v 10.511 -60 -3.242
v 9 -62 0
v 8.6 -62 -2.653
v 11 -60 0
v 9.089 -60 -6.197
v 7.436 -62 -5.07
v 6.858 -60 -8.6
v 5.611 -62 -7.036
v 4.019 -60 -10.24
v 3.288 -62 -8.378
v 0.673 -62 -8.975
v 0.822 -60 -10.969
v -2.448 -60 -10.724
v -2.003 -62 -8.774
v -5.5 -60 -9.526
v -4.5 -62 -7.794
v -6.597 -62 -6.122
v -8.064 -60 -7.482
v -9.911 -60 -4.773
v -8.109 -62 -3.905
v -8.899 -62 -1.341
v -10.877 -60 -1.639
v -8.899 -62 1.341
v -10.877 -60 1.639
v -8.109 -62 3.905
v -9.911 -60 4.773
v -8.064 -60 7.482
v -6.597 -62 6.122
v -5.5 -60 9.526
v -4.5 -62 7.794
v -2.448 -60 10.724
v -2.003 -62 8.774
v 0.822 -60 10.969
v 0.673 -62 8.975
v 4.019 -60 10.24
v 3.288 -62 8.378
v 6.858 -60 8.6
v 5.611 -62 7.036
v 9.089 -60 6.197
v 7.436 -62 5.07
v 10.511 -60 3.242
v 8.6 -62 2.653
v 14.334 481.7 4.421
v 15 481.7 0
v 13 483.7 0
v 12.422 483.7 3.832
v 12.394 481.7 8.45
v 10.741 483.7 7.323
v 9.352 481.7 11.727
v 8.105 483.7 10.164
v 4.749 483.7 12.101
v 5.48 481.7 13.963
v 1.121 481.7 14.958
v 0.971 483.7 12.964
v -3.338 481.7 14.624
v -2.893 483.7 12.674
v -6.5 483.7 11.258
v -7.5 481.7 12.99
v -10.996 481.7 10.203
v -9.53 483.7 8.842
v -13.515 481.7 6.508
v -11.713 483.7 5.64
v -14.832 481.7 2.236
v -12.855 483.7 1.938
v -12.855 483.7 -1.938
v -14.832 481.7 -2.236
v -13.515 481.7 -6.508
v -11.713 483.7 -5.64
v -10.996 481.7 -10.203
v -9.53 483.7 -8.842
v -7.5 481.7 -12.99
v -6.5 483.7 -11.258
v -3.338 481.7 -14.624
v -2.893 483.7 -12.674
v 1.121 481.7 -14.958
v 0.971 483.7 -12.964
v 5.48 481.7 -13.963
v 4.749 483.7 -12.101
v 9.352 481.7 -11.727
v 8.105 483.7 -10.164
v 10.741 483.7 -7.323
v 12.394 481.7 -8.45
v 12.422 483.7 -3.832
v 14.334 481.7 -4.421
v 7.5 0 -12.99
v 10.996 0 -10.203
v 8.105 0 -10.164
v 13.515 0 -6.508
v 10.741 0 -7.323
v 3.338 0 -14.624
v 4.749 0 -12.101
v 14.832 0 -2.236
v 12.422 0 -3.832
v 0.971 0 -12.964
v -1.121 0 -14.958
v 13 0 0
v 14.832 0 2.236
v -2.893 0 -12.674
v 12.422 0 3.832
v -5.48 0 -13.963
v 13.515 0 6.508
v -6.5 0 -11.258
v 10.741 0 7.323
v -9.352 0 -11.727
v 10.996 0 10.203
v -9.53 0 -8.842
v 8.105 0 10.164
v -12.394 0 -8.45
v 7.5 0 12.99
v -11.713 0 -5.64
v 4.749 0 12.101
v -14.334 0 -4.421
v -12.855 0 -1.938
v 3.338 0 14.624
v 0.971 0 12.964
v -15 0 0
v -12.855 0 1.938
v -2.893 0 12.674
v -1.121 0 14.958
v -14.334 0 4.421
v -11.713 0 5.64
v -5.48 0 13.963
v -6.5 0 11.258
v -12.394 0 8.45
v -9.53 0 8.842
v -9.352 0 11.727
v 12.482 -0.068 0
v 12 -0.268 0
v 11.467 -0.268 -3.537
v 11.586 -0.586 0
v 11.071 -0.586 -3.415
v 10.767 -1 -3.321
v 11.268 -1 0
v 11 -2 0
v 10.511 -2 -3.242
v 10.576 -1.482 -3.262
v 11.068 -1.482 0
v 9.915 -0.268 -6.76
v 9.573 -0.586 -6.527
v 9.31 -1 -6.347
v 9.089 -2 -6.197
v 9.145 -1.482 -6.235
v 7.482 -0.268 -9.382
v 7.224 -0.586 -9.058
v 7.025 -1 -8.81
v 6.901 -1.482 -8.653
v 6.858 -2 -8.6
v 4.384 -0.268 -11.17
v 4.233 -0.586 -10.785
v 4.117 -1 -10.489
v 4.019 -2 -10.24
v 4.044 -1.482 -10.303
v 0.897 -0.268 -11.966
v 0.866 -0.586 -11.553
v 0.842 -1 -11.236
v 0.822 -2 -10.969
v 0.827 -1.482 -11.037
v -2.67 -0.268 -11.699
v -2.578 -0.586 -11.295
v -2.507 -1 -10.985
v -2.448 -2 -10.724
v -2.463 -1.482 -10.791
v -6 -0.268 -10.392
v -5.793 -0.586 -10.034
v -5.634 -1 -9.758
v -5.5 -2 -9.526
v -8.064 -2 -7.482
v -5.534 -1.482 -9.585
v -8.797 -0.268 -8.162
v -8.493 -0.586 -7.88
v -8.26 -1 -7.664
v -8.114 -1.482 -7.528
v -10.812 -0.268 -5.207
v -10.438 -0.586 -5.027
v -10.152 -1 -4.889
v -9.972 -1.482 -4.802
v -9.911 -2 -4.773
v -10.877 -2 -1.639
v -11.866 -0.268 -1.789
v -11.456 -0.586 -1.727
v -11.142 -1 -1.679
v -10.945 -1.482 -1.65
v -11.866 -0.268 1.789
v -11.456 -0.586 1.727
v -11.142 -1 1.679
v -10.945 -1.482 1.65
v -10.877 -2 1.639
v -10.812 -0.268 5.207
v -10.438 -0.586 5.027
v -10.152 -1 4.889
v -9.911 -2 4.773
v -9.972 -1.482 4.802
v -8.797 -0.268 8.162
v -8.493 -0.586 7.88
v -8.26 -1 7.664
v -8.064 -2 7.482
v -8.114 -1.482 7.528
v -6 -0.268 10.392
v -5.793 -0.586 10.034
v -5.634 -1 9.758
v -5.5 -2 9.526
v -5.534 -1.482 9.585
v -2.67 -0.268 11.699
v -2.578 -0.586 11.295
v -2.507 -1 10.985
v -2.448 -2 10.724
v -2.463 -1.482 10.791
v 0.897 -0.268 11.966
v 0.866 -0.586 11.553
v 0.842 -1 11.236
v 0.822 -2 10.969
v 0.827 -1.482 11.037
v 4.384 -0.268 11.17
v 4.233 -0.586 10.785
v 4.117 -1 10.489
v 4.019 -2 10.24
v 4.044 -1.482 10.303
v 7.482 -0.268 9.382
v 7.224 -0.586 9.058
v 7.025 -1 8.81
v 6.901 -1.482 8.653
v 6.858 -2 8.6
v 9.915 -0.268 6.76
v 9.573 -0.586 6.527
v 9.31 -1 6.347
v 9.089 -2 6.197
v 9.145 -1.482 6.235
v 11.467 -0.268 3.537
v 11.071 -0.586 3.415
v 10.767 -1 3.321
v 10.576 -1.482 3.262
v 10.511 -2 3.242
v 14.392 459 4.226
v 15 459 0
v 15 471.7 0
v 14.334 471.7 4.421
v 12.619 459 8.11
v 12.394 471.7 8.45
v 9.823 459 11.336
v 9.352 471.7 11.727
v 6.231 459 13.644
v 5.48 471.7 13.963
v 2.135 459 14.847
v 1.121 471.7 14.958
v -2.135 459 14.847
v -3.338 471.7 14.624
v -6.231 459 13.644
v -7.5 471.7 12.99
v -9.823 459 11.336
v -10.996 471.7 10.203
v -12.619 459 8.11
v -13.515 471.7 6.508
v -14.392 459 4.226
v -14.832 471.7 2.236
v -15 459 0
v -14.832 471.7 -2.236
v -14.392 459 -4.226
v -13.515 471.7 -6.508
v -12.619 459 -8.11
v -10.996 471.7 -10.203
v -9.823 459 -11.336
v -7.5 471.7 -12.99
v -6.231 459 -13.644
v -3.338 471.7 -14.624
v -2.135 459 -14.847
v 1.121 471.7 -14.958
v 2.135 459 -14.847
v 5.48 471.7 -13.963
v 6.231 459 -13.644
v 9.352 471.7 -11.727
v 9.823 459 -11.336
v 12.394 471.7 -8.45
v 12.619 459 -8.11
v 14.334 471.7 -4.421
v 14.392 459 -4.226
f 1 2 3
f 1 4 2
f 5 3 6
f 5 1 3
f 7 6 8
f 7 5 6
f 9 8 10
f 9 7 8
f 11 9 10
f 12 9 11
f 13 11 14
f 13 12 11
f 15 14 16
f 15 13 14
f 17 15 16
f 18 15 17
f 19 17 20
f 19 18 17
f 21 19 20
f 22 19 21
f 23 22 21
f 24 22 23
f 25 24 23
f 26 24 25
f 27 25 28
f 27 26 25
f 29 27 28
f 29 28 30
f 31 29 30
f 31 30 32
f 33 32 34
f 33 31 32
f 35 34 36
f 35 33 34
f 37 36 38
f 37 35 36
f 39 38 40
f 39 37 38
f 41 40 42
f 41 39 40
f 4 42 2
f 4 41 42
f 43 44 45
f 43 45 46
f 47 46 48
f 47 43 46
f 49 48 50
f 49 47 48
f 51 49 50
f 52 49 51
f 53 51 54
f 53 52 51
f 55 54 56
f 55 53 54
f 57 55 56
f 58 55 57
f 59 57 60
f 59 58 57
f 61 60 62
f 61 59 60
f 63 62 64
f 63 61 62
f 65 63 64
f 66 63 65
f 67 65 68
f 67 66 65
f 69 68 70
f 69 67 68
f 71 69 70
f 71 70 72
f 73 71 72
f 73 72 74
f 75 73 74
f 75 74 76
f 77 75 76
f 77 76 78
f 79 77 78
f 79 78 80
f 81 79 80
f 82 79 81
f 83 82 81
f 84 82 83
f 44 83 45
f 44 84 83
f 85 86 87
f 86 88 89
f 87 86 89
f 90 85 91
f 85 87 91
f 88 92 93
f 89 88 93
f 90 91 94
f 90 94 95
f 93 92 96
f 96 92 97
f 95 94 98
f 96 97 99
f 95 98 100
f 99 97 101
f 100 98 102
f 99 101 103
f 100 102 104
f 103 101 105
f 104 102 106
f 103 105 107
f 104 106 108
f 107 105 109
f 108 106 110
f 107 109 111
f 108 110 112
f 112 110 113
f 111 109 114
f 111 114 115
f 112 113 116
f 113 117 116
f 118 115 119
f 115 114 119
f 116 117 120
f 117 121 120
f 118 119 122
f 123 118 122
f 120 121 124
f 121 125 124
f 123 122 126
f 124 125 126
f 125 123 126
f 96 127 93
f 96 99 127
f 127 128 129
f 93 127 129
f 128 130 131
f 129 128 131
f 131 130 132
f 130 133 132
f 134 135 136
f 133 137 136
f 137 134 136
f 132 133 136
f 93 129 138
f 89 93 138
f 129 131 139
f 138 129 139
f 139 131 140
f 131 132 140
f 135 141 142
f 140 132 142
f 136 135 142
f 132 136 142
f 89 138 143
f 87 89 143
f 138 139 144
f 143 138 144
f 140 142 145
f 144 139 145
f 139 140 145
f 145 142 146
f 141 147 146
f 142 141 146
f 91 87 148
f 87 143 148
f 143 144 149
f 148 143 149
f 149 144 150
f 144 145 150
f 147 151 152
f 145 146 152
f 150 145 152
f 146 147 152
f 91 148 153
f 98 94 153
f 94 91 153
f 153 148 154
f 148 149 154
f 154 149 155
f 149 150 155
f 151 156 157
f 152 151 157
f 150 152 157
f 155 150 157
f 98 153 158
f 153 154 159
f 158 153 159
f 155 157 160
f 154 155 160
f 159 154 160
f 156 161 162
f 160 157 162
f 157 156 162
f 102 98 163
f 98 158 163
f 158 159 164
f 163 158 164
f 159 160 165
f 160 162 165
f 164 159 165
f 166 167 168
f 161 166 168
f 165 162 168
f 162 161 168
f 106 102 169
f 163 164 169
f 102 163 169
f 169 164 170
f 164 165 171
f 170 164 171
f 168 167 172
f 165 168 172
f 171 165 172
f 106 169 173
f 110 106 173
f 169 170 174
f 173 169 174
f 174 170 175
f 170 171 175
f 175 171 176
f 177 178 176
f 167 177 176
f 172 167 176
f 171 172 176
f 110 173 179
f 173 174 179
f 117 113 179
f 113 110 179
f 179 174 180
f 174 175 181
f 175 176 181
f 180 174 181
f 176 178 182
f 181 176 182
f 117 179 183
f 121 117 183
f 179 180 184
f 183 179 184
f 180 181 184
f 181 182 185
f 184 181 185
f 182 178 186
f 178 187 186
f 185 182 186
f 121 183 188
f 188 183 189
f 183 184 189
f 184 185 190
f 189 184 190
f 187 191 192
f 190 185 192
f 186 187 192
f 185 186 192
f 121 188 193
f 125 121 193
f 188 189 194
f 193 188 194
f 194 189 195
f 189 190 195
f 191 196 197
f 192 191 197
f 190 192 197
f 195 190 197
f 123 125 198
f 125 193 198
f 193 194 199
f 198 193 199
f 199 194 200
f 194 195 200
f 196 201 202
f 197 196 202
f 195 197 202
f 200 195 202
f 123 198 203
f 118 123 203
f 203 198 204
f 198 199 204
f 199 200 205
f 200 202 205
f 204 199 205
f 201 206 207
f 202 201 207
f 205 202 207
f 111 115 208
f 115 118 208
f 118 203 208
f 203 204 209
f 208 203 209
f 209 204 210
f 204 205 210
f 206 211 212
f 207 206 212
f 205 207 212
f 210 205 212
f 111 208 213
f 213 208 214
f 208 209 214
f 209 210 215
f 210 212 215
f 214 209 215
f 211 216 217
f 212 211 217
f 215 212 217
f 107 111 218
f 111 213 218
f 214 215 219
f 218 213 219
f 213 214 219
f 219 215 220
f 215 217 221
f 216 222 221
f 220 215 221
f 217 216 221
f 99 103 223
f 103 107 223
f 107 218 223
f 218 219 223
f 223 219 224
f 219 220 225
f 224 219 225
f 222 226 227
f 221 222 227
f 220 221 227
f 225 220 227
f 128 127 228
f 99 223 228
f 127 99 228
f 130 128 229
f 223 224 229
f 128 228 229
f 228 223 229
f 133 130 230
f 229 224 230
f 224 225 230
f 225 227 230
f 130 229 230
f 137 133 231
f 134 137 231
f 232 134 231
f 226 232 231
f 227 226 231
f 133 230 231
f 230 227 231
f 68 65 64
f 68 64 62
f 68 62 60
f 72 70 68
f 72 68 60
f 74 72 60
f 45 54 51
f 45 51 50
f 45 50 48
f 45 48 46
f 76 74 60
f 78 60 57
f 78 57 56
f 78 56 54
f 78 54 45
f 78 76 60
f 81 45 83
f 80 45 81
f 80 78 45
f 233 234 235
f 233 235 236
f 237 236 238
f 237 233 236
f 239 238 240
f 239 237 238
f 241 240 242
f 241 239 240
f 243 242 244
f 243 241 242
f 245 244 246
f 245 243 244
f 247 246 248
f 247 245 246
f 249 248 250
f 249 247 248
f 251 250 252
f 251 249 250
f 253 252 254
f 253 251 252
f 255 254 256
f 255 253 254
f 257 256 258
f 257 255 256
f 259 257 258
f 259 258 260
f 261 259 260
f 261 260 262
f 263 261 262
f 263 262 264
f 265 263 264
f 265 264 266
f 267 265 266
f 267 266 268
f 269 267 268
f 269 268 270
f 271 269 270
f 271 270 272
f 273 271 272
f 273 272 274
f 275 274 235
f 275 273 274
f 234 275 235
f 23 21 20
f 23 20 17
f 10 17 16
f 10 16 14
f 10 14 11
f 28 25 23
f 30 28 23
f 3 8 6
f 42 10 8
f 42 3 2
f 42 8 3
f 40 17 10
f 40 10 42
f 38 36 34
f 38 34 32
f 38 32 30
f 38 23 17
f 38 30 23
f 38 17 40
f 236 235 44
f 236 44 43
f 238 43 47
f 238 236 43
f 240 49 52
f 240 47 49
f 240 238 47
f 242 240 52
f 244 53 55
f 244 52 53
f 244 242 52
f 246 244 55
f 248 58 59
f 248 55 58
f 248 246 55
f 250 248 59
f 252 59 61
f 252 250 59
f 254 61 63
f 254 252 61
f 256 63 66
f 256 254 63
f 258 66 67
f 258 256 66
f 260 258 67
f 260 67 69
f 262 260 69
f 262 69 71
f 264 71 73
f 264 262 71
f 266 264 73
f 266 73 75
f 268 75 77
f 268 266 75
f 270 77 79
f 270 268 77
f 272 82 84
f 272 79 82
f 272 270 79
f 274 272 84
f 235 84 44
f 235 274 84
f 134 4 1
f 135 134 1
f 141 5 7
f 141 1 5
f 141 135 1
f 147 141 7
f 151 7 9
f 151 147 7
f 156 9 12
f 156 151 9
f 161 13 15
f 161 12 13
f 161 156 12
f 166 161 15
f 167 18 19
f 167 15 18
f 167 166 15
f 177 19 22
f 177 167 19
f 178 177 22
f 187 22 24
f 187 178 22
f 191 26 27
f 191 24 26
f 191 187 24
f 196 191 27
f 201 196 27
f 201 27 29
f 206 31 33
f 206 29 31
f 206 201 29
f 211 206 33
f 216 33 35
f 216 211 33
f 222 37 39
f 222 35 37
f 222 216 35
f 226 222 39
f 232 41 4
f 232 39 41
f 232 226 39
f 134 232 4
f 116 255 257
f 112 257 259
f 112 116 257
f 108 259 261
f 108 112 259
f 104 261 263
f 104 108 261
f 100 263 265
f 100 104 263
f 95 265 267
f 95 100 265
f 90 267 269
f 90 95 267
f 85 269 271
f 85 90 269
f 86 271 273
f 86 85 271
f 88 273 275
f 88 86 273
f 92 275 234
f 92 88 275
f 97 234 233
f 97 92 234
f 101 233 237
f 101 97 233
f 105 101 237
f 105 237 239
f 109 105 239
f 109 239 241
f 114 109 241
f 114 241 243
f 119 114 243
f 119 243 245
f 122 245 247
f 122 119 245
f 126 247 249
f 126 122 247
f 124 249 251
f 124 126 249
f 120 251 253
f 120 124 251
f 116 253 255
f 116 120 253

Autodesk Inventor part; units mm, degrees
ref_plane "YZ Plane" through (0, 0, 0) normal (1, 0, 0) x (0, 1, 0)
ref_plane "XZ Plane" through (0, 0, 0) normal (0, 1, 0) x (-1, 0, 0)
ref_plane "XY Plane" through (0, 0, 0) normal (0, 0, 1) x (1, 0, 0)
sketch "Sketch1" plane through (0, 0, 0) normal (0, 1, 0) x (-1, 0, 0)
  circle A0 centre (0, 0) radius 15
  dimension "d0" = 30
extrude "Extrusion1" add sketch "Sketch1" along normal blind 459
sketch "Sketch2" plane through (0, 0, 0) normal (0, -1, 0) x (1, 0, 0)
  circle A0 centre (0, 0) radius 11
  dimension "d3" = 22
extrude "Extrusion2" add sketch "Sketch2" along normal blind 62
fillet "Fillet1" radius 2 1 edges at (-11, 0, 0)
sketch "Sketch3" plane through (0, 459, 0) normal (0, 1, 0) x (1, 0, 0)
  circle A0 centre (0, 0) radius 15
  dimension "d7" = 30
extrude "Extrusion3" add sketch "Sketch3" along normal blind 12.7
thread "Thread2" size "M22x3" class "6g" standard "ANSI Metric M Profile" length 60
sketch "Sketch4" plane through (0, 471.7, 0) normal (0, 1, 0) x (1, 0, 0)
  circle A0 centre (0, 0) radius 15 projected
extrude "Extrusion4" add sketch "Sketch4" along normal blind 12
thread "Thread3" size "M30x3.5" class "6g" standard "ANSI Metric M Profile" length 40
chamfer "Chamfer1" distance 2 angle 45 1 edges at (-15, 483.7, 0)
chamfer "Chamfer2" distance 2 angle 45 1 edges at (-11, -62, 0)
properties part number "BARRA SOPORTE"
